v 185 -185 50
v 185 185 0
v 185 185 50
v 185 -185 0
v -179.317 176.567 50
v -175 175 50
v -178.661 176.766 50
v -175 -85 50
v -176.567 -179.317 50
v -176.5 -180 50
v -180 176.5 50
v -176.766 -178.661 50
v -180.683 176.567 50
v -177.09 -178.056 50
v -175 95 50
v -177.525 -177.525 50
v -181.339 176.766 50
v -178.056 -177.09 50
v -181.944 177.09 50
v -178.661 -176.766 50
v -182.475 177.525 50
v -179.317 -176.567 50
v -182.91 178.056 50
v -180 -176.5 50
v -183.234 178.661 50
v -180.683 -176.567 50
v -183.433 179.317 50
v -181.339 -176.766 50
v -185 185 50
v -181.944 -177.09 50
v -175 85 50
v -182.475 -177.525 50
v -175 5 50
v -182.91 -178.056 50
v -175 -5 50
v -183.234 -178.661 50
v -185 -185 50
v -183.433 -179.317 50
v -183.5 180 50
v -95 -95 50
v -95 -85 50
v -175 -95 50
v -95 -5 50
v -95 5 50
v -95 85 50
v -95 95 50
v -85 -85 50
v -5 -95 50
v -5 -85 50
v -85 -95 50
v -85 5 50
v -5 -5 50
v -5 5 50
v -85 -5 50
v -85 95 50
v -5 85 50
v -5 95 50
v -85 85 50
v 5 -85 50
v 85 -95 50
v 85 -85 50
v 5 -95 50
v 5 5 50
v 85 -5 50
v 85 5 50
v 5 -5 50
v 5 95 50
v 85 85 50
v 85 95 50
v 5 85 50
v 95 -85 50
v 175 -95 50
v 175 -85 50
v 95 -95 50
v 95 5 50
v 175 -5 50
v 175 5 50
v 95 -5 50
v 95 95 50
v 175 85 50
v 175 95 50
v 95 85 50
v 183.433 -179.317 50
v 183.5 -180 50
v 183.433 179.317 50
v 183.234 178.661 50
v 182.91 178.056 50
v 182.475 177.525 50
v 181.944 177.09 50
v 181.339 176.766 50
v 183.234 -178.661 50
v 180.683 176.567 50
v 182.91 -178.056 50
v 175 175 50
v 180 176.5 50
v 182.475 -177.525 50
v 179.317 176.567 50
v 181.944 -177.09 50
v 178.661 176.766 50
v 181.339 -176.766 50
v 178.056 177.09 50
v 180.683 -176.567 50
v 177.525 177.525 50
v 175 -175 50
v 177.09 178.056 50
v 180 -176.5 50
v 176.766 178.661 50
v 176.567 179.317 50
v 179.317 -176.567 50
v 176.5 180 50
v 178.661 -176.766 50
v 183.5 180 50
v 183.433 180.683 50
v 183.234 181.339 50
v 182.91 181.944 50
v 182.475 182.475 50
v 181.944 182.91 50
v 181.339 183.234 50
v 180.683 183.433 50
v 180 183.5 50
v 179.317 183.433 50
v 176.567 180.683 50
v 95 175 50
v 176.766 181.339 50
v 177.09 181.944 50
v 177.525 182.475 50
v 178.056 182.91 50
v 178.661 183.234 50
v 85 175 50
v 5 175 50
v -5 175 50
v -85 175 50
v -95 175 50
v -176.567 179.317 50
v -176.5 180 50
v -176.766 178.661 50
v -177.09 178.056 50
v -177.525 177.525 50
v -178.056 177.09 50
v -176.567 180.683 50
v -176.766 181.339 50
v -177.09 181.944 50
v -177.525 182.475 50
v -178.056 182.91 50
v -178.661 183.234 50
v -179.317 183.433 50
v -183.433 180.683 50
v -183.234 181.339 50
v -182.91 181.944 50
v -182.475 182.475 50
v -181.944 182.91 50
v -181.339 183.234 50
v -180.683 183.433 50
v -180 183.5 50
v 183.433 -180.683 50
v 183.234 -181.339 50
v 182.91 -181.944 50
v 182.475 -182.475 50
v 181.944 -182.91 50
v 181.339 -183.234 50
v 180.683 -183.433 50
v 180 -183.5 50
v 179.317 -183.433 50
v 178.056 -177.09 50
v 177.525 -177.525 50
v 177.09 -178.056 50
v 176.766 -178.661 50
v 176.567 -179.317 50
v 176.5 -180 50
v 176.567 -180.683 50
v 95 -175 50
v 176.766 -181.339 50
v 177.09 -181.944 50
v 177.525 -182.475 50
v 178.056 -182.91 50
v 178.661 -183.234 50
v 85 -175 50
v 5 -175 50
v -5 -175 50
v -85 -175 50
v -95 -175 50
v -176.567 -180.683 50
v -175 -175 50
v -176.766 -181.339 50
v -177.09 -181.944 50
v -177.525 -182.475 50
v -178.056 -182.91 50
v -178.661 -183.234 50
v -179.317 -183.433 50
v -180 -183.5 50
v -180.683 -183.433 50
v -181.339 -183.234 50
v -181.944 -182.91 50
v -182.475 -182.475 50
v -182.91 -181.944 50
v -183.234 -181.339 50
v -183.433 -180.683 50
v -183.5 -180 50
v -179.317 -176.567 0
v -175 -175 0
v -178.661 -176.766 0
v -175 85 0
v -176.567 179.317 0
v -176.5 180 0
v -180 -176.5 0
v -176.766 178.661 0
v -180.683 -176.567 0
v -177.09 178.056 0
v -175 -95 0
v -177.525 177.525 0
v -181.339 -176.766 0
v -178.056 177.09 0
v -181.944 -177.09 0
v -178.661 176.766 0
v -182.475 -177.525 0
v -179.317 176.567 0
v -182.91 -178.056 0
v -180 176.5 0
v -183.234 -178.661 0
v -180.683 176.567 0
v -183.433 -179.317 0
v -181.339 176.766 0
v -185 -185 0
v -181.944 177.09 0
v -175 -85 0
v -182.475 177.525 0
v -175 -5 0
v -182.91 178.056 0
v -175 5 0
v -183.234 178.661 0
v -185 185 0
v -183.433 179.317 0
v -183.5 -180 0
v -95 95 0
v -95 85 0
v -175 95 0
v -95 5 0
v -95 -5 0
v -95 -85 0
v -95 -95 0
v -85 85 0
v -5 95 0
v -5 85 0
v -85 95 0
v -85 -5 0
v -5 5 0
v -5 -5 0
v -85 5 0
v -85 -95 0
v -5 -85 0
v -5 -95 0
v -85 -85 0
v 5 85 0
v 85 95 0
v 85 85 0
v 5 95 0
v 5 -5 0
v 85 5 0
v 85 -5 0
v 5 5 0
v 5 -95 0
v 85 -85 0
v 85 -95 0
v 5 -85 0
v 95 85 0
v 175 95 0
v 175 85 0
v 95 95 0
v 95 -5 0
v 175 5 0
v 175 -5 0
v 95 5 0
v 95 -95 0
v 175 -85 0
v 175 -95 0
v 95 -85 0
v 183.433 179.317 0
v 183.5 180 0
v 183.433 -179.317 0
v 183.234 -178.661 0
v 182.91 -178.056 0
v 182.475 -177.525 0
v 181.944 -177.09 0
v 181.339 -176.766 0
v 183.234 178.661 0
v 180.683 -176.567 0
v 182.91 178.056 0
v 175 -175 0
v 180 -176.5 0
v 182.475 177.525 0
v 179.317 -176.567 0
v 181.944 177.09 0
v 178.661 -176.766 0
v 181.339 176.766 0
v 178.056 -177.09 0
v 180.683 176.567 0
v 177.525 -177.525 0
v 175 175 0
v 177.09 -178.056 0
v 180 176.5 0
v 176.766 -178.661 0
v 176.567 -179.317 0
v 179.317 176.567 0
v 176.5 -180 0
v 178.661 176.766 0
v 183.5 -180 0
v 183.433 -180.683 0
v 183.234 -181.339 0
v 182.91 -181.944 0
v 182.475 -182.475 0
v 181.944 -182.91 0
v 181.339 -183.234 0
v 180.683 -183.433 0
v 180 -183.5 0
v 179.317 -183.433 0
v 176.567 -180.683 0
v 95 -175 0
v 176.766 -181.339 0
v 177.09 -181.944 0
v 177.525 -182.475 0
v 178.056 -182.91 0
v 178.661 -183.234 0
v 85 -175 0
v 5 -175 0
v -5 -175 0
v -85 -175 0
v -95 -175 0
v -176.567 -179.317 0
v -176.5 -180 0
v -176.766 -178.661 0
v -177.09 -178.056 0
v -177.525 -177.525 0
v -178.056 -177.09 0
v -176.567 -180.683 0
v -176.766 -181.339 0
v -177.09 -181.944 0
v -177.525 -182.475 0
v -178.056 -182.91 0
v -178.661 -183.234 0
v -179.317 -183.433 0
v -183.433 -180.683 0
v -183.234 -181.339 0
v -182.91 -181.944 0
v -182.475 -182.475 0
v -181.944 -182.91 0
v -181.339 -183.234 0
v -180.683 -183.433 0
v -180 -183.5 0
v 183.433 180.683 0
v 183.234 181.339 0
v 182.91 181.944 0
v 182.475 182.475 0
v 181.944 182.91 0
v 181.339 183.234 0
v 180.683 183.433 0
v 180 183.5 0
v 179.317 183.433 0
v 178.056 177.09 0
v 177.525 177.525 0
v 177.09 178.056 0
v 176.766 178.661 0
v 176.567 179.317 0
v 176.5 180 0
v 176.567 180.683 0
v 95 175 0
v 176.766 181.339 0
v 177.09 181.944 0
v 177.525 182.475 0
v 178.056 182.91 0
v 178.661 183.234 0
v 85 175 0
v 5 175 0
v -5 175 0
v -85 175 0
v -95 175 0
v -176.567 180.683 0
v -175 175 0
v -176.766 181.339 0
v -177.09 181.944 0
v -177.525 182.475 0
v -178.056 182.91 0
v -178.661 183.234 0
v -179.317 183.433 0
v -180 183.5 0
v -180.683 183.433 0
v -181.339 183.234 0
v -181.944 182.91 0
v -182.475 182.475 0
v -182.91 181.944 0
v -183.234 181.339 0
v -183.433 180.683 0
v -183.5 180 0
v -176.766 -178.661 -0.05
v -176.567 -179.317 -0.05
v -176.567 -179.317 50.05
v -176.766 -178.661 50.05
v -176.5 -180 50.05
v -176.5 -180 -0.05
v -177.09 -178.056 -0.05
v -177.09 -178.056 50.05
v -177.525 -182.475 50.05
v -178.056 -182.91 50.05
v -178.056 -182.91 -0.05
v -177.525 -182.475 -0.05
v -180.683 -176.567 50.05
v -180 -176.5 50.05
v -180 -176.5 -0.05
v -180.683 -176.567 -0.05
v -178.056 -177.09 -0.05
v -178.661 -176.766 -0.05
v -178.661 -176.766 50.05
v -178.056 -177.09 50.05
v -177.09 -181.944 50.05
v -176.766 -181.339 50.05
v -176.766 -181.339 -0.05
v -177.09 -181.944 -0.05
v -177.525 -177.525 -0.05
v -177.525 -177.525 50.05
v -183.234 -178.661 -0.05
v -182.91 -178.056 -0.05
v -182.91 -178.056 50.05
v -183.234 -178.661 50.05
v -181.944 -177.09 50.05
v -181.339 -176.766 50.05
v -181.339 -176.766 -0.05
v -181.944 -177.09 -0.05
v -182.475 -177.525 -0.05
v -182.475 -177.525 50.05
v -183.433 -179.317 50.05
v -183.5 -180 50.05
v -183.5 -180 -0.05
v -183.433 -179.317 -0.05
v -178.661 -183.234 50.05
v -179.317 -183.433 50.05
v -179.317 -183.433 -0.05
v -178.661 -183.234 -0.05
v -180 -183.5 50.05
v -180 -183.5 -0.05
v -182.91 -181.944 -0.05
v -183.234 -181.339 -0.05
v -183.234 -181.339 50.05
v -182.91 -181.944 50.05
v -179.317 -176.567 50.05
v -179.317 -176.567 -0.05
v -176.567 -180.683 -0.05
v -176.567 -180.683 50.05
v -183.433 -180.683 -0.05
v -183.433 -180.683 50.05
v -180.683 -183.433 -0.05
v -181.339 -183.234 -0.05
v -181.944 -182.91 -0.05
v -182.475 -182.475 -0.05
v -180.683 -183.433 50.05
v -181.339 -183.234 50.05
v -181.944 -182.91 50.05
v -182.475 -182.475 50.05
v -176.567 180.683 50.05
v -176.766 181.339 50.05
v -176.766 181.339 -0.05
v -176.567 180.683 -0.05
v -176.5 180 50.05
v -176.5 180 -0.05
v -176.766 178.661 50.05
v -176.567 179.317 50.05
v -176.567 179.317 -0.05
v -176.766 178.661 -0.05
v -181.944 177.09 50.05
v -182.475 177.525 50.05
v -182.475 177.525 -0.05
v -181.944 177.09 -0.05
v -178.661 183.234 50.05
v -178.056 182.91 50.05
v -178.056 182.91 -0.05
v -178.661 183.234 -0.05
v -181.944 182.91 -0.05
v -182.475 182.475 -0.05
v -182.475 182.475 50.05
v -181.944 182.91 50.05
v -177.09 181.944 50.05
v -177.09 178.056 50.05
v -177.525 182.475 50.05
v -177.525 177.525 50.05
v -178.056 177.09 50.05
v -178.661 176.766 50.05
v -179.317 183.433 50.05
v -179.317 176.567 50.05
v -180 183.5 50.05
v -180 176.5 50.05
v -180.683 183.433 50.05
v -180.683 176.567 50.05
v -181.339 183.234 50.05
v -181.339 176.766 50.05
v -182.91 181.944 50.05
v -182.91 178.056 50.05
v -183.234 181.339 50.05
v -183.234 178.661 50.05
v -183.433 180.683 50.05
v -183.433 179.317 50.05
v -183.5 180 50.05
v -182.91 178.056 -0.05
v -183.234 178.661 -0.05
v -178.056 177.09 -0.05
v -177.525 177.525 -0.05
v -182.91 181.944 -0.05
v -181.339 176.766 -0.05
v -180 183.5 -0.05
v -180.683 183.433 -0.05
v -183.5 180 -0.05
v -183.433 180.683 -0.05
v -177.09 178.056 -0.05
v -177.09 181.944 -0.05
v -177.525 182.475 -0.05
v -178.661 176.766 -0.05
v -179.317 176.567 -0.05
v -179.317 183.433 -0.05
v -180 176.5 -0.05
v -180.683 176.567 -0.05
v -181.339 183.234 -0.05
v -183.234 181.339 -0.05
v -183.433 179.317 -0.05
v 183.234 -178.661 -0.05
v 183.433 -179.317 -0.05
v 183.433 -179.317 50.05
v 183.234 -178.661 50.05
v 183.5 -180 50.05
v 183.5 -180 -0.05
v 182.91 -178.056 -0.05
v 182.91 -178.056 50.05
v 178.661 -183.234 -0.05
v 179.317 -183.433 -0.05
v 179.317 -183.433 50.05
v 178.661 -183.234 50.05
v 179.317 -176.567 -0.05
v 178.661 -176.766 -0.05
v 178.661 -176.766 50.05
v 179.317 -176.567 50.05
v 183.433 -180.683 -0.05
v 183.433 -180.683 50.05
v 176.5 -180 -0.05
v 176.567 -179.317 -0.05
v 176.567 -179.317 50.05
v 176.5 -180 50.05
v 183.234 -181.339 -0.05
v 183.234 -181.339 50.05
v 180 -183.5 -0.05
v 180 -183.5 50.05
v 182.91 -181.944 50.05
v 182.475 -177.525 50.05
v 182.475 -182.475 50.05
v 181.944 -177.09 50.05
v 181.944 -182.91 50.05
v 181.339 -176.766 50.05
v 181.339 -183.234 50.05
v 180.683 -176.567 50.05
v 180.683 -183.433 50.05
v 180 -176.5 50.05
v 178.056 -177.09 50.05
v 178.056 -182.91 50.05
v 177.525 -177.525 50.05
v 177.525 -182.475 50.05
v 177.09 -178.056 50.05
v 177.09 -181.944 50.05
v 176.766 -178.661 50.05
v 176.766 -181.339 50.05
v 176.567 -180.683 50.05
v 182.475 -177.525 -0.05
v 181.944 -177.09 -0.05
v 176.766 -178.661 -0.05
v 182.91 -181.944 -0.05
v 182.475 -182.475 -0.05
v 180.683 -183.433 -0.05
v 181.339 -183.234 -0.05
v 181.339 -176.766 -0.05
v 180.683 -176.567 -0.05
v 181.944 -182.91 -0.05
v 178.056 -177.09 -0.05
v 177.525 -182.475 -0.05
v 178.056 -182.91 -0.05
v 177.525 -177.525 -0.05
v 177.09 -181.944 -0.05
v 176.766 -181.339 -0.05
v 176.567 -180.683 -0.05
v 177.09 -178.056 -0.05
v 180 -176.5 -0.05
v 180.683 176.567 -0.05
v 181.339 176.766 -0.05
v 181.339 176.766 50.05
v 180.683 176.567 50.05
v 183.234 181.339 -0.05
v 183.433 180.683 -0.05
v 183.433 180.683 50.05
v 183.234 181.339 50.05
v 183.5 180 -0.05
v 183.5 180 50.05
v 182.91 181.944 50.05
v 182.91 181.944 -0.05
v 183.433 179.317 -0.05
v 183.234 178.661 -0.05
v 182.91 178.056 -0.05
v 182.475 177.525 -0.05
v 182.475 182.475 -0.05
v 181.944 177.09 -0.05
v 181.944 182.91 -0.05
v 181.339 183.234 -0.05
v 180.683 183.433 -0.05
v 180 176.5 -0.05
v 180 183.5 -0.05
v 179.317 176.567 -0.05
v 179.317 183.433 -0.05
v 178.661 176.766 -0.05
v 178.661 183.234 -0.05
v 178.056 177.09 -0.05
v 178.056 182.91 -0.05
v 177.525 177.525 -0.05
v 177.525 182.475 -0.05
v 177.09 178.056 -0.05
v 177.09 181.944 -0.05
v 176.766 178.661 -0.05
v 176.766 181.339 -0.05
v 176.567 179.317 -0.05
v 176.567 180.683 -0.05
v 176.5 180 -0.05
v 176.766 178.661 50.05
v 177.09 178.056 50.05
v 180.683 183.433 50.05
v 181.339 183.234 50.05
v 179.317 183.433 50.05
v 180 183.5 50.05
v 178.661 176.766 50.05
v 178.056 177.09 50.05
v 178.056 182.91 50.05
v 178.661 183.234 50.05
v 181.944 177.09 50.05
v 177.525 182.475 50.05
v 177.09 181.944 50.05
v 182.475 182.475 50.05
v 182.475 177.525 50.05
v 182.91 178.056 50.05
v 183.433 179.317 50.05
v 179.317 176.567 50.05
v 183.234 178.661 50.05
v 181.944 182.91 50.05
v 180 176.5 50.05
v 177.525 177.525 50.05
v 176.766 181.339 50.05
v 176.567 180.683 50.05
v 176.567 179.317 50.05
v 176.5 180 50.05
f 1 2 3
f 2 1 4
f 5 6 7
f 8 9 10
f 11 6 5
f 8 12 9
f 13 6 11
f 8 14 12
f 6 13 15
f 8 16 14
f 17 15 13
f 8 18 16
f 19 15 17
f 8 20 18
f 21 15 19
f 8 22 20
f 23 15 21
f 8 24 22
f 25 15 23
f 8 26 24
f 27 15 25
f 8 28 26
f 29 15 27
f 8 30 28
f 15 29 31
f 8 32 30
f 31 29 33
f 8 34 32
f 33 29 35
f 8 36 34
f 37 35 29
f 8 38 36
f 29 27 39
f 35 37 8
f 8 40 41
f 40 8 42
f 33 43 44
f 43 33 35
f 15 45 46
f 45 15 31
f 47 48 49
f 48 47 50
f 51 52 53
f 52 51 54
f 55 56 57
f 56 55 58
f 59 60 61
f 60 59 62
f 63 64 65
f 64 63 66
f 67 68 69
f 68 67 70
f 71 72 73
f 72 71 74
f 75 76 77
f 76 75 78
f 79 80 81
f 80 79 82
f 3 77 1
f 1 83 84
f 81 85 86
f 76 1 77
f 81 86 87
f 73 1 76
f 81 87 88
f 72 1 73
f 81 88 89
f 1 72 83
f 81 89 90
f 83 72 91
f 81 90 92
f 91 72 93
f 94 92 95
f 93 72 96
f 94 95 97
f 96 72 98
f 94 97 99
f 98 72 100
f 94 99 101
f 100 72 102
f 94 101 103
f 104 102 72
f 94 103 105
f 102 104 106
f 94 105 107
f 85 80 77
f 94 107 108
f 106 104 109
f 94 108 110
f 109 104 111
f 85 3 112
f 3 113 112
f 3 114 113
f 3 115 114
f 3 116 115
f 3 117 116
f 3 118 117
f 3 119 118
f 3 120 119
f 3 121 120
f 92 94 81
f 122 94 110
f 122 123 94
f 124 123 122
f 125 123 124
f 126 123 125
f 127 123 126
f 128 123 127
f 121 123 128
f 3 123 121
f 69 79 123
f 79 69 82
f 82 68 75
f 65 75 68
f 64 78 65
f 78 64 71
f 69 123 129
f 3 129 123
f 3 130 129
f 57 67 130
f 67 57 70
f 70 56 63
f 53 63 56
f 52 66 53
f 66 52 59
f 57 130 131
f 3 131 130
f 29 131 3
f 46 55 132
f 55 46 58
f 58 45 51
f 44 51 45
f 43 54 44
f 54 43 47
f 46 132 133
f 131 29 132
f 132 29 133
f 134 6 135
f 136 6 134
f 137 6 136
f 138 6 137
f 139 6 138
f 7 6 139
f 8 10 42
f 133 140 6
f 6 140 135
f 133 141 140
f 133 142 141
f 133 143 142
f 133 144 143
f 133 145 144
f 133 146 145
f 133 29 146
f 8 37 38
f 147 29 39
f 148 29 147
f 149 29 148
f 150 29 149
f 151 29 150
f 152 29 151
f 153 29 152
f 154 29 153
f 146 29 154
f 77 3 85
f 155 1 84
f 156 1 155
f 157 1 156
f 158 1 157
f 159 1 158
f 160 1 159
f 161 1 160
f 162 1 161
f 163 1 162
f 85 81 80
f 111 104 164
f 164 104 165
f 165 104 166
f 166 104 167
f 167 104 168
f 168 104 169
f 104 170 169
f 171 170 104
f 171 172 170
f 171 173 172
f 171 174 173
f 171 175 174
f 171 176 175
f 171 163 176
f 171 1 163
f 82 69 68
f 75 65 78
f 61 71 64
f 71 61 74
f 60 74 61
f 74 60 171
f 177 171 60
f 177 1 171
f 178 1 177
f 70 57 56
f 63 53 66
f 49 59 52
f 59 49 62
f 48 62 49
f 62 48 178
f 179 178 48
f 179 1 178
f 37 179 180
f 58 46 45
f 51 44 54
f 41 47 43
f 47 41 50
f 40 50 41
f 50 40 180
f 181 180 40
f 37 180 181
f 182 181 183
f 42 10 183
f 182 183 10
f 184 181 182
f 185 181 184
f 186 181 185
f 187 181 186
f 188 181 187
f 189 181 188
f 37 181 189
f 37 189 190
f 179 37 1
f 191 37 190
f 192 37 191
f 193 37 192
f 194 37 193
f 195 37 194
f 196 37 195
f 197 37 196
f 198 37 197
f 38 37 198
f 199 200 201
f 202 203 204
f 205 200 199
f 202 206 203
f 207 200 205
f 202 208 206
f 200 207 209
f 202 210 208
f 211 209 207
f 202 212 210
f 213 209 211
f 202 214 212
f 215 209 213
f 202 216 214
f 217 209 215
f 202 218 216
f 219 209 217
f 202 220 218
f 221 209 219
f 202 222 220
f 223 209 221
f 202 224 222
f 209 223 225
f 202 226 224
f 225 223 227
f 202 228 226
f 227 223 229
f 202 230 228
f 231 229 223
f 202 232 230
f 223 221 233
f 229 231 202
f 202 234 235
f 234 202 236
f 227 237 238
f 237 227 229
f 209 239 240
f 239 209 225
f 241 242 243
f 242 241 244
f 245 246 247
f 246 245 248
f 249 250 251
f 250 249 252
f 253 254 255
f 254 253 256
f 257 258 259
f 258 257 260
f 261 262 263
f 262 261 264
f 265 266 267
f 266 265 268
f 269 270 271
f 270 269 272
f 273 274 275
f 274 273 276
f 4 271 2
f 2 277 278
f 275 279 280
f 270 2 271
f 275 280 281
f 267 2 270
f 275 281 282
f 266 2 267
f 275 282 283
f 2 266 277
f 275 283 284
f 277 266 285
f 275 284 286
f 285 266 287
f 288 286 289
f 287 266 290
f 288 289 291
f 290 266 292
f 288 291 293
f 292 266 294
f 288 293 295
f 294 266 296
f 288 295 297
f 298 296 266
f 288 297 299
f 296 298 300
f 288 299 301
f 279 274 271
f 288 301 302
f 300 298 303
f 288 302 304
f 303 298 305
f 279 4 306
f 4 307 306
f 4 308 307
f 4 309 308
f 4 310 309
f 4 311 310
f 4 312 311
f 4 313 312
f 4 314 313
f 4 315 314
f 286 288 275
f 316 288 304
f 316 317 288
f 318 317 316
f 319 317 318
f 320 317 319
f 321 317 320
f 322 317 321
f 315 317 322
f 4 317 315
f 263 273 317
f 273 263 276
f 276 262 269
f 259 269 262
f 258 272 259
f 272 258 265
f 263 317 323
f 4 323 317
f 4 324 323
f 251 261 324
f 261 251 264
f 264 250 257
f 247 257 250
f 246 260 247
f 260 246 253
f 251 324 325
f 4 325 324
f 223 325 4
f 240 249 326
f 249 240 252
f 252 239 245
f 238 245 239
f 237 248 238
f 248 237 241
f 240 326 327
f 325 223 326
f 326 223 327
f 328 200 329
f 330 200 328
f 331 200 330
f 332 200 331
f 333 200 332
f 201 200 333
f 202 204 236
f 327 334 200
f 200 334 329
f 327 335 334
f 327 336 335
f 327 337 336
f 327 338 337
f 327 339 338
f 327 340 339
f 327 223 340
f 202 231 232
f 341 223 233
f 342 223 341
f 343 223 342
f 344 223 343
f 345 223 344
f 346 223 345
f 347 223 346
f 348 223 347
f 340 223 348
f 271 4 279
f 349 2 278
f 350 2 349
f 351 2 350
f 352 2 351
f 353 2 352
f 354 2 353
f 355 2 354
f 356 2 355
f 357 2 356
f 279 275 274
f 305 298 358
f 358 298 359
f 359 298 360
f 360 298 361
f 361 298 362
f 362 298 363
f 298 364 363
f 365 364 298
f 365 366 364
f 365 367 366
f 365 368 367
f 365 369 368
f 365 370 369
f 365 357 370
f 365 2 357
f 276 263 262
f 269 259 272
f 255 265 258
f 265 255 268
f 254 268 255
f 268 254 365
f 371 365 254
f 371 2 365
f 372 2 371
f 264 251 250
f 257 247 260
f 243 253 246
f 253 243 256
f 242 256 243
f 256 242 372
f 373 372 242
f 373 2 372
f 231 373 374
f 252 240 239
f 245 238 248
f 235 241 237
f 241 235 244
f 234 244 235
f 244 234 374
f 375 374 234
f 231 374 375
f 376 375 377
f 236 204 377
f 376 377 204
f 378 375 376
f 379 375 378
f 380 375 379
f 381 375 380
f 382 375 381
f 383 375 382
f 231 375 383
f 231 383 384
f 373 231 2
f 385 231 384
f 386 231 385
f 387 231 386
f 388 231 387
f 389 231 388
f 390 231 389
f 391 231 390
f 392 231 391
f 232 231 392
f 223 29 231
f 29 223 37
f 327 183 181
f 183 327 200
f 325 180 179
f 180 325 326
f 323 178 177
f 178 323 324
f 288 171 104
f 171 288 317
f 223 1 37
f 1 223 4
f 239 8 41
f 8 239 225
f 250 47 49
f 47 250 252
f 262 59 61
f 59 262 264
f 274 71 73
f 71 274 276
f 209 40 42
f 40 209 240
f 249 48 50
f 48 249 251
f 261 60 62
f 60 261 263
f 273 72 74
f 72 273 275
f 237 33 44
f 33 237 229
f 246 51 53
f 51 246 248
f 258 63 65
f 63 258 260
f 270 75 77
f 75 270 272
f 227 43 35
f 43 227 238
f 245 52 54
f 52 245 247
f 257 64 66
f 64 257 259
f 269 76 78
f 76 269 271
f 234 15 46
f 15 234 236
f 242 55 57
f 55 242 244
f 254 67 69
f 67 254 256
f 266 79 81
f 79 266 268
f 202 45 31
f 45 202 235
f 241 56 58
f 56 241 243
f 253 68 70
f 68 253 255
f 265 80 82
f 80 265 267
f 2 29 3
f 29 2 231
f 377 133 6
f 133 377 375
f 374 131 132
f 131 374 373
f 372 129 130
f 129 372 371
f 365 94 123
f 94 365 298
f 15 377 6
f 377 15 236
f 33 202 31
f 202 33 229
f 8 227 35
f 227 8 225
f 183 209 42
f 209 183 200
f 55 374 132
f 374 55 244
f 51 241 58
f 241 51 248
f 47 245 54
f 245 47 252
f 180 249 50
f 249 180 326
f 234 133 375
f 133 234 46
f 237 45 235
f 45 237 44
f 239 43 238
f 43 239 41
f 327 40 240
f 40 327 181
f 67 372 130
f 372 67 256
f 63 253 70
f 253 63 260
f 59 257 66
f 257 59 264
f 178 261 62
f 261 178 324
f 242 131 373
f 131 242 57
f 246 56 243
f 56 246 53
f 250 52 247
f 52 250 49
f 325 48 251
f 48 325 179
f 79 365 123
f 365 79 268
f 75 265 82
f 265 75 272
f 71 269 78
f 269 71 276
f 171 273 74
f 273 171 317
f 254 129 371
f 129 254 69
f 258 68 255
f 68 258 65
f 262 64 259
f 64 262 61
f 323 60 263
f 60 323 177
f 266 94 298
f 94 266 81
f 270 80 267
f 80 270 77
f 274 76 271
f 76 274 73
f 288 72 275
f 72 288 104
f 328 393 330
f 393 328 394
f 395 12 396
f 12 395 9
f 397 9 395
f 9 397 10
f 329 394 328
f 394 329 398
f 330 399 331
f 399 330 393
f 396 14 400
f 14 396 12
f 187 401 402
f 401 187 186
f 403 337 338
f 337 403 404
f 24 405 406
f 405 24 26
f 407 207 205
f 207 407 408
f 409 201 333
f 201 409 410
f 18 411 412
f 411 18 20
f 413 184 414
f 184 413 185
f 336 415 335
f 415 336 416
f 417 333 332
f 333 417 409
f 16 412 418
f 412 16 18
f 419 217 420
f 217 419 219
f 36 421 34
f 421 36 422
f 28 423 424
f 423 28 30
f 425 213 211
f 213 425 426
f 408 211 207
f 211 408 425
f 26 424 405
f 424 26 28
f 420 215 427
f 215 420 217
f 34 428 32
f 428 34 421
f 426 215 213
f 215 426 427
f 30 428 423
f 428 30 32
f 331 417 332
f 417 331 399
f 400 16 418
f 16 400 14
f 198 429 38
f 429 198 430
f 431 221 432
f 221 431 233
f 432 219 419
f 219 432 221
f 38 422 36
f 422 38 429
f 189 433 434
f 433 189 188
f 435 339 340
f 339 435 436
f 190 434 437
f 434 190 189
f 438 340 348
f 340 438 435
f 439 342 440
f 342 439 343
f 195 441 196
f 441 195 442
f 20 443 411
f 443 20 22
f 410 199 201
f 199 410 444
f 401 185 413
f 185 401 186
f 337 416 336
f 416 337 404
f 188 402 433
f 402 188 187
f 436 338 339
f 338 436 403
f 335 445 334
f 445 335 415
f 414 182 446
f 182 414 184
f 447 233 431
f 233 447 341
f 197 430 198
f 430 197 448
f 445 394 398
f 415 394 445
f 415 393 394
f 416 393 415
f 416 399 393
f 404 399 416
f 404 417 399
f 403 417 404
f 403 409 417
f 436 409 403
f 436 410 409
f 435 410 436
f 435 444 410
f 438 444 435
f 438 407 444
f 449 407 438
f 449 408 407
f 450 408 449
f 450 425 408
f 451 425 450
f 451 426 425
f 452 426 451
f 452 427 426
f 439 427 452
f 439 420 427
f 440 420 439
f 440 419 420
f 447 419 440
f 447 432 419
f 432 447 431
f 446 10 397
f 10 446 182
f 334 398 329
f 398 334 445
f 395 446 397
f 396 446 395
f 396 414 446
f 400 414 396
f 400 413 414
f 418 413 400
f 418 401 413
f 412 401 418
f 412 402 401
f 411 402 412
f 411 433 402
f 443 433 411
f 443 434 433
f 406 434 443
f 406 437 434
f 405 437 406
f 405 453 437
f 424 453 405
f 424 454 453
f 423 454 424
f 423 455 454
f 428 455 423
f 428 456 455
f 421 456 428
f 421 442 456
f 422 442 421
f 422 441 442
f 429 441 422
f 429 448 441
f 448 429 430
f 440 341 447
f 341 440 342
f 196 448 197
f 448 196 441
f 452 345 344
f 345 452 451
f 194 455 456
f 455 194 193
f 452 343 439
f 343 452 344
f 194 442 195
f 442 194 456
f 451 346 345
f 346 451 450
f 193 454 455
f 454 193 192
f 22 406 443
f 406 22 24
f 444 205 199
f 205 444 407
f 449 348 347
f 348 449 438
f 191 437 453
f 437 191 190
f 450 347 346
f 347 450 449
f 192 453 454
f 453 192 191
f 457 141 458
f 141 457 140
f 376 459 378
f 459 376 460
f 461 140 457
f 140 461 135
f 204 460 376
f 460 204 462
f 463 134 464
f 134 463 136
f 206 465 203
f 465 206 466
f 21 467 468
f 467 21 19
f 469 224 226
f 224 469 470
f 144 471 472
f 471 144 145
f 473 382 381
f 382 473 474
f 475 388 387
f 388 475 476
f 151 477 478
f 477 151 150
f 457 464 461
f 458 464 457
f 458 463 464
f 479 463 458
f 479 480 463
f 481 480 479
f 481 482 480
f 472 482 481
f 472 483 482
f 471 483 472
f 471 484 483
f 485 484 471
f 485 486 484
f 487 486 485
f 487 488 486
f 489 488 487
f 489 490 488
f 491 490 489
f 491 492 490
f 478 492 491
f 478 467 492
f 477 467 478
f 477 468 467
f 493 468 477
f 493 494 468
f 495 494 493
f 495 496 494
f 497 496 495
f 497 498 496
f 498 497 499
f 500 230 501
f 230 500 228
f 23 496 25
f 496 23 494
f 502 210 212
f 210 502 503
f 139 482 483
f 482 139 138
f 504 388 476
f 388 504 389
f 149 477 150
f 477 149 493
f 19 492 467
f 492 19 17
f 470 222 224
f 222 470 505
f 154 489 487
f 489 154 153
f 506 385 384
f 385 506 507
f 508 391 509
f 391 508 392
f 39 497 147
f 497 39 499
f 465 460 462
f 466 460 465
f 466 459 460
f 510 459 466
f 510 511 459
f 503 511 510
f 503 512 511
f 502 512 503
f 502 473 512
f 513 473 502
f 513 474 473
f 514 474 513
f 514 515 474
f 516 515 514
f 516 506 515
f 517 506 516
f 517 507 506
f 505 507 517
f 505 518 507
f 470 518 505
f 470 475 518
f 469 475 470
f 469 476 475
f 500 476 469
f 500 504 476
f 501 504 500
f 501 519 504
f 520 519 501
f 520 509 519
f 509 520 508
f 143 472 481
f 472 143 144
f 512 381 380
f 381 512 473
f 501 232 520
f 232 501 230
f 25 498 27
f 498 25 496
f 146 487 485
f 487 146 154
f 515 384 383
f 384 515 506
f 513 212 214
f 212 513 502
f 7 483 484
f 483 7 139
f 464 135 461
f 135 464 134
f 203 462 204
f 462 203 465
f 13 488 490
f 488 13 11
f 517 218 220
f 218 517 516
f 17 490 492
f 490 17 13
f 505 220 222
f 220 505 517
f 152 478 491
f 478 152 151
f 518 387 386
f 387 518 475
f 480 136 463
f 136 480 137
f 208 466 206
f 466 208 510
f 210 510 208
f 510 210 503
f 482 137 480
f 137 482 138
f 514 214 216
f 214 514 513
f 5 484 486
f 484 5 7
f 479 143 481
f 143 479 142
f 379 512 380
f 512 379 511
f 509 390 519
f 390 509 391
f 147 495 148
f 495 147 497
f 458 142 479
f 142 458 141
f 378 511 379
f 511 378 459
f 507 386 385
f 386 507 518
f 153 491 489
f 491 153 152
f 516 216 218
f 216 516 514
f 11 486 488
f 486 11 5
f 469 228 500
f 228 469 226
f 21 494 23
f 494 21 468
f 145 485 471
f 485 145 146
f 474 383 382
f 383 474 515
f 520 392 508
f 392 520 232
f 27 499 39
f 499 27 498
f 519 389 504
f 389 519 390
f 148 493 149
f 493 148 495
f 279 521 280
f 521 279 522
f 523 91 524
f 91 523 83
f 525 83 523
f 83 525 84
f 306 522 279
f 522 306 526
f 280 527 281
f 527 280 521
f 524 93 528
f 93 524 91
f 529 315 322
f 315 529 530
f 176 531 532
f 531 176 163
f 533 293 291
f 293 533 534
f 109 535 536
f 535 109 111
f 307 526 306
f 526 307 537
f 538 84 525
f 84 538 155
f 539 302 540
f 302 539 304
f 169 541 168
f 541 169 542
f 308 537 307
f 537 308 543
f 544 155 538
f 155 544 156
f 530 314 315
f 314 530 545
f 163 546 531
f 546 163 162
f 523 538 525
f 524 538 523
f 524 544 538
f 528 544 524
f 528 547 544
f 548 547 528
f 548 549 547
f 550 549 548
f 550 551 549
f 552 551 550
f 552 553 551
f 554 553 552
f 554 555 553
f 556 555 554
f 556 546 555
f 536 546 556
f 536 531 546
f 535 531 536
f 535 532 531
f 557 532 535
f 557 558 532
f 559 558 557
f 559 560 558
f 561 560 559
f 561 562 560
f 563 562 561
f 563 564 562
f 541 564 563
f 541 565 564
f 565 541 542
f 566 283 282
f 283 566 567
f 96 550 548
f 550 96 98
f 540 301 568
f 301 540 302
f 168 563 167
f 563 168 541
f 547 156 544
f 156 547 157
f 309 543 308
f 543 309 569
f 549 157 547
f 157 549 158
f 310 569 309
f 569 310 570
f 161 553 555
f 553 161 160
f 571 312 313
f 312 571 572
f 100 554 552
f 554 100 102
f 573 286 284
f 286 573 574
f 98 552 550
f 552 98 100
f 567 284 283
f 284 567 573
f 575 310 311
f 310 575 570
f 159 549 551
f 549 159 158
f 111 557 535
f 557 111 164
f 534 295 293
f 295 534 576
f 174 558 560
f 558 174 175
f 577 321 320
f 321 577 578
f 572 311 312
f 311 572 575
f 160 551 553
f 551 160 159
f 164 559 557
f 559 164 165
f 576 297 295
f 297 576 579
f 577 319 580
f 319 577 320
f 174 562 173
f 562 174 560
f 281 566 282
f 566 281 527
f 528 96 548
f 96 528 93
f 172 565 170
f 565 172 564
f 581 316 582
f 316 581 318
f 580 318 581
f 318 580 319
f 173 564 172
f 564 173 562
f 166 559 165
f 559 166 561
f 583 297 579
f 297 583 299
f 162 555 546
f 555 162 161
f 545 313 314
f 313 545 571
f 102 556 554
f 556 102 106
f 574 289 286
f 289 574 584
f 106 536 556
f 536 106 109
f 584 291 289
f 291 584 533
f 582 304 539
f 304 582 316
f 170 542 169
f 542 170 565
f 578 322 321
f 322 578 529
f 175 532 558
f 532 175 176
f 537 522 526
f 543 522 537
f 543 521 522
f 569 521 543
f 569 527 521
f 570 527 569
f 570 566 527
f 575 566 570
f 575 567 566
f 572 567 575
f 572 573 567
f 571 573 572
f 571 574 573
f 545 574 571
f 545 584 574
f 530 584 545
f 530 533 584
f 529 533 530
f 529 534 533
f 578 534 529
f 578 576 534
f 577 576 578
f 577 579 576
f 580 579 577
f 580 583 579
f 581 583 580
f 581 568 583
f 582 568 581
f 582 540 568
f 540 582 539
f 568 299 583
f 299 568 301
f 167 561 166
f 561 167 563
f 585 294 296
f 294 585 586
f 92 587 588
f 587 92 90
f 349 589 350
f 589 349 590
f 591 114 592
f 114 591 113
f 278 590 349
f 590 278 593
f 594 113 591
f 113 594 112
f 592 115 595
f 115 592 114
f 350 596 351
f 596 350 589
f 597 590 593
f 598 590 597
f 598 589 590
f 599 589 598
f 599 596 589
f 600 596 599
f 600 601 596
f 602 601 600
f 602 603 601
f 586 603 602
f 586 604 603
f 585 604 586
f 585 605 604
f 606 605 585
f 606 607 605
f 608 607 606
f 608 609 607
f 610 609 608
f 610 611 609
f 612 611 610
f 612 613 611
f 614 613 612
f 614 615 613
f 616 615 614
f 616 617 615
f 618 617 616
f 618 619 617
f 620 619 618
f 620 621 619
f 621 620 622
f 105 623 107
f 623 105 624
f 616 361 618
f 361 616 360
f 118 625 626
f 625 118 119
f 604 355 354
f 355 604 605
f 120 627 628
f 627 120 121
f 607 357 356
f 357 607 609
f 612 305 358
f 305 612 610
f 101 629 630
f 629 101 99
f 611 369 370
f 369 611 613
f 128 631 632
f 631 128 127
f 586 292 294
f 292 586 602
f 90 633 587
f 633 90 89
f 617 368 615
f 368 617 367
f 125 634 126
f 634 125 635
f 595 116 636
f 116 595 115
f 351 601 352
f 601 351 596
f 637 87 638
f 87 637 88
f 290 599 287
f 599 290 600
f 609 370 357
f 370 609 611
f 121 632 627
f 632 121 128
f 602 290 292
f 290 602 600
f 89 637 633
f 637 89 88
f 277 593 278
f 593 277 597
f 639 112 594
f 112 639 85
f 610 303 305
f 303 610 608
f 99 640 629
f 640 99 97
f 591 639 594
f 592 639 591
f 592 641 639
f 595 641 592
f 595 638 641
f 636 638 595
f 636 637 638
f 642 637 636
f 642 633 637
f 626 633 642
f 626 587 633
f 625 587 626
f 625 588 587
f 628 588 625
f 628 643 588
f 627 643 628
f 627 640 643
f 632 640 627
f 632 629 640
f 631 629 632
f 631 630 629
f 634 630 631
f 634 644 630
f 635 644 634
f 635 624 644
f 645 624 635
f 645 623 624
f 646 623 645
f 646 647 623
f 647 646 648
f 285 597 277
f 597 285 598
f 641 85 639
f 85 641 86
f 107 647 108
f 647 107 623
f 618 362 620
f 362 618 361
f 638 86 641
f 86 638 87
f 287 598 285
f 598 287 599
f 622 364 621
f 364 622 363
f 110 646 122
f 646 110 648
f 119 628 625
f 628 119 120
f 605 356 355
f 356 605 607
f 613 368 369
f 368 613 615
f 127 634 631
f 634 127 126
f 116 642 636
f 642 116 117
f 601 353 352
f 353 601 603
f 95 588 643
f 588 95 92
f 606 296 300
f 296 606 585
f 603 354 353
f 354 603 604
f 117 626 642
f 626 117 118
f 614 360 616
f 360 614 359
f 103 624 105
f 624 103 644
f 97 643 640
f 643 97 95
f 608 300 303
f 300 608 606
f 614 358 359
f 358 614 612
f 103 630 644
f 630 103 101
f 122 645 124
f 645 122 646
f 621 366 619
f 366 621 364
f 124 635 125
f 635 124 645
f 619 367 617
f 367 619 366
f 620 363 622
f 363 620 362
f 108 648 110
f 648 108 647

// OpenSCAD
// Part Name: Cage_Layer_12_H50mm
// This part represents a horizontal slice of the cage.
// It is designed to be 3D printed on its base.

// Parameters for the cage
bar_t = 10;
gap_xy = 80;
hole_d = 7;
cage_ext_xy = 370;

// Calculate bar center positions relative to the overall cage center
bar_centers_xy = [for (j = [0:4]) (-cage_ext_xy/2 + bar_t/2 + j * (bar_t + gap_xy))];

// Module to generate a single layer segment
module cage_layer_segment(height) {
    // Offset for printing on z=0 plane. The module itself is centered on XY=0, so this Z offset moves its base to Z=0.
    translate([0, 0, height/2]) {
        union() {
            // Horizontal bars (along X)
            for (y_center = bar_centers_xy) {
                translate([0, y_center, 0])
                cube([cage_ext_xy, bar_t, height], center = true);
            }

            // Vertical bars (along Y)
            for (x_center = bar_centers_xy) {
                translate([x_center, 0, 0])
                cube([bar_t, cage_ext_xy, height], center = true);
            }

            // Subtract holes for M6 rods at the 4 corners
            corner_offsets_xy = [bar_centers_xy[0], bar_centers_xy[4]];

            for (x_offset = corner_offsets_xy) {
                for (y_offset = corner_offsets_xy) {
                    // Hole through the center of the corner bar
                    translate([x_offset, y_offset, 0])
                    cylinder(h = height + 0.1, d = hole_d, center = true, $fn=32); // +0.1 for clean cut
                }
            }
        }
    }
}

// Render the segment
cage_layer_segment(50);
